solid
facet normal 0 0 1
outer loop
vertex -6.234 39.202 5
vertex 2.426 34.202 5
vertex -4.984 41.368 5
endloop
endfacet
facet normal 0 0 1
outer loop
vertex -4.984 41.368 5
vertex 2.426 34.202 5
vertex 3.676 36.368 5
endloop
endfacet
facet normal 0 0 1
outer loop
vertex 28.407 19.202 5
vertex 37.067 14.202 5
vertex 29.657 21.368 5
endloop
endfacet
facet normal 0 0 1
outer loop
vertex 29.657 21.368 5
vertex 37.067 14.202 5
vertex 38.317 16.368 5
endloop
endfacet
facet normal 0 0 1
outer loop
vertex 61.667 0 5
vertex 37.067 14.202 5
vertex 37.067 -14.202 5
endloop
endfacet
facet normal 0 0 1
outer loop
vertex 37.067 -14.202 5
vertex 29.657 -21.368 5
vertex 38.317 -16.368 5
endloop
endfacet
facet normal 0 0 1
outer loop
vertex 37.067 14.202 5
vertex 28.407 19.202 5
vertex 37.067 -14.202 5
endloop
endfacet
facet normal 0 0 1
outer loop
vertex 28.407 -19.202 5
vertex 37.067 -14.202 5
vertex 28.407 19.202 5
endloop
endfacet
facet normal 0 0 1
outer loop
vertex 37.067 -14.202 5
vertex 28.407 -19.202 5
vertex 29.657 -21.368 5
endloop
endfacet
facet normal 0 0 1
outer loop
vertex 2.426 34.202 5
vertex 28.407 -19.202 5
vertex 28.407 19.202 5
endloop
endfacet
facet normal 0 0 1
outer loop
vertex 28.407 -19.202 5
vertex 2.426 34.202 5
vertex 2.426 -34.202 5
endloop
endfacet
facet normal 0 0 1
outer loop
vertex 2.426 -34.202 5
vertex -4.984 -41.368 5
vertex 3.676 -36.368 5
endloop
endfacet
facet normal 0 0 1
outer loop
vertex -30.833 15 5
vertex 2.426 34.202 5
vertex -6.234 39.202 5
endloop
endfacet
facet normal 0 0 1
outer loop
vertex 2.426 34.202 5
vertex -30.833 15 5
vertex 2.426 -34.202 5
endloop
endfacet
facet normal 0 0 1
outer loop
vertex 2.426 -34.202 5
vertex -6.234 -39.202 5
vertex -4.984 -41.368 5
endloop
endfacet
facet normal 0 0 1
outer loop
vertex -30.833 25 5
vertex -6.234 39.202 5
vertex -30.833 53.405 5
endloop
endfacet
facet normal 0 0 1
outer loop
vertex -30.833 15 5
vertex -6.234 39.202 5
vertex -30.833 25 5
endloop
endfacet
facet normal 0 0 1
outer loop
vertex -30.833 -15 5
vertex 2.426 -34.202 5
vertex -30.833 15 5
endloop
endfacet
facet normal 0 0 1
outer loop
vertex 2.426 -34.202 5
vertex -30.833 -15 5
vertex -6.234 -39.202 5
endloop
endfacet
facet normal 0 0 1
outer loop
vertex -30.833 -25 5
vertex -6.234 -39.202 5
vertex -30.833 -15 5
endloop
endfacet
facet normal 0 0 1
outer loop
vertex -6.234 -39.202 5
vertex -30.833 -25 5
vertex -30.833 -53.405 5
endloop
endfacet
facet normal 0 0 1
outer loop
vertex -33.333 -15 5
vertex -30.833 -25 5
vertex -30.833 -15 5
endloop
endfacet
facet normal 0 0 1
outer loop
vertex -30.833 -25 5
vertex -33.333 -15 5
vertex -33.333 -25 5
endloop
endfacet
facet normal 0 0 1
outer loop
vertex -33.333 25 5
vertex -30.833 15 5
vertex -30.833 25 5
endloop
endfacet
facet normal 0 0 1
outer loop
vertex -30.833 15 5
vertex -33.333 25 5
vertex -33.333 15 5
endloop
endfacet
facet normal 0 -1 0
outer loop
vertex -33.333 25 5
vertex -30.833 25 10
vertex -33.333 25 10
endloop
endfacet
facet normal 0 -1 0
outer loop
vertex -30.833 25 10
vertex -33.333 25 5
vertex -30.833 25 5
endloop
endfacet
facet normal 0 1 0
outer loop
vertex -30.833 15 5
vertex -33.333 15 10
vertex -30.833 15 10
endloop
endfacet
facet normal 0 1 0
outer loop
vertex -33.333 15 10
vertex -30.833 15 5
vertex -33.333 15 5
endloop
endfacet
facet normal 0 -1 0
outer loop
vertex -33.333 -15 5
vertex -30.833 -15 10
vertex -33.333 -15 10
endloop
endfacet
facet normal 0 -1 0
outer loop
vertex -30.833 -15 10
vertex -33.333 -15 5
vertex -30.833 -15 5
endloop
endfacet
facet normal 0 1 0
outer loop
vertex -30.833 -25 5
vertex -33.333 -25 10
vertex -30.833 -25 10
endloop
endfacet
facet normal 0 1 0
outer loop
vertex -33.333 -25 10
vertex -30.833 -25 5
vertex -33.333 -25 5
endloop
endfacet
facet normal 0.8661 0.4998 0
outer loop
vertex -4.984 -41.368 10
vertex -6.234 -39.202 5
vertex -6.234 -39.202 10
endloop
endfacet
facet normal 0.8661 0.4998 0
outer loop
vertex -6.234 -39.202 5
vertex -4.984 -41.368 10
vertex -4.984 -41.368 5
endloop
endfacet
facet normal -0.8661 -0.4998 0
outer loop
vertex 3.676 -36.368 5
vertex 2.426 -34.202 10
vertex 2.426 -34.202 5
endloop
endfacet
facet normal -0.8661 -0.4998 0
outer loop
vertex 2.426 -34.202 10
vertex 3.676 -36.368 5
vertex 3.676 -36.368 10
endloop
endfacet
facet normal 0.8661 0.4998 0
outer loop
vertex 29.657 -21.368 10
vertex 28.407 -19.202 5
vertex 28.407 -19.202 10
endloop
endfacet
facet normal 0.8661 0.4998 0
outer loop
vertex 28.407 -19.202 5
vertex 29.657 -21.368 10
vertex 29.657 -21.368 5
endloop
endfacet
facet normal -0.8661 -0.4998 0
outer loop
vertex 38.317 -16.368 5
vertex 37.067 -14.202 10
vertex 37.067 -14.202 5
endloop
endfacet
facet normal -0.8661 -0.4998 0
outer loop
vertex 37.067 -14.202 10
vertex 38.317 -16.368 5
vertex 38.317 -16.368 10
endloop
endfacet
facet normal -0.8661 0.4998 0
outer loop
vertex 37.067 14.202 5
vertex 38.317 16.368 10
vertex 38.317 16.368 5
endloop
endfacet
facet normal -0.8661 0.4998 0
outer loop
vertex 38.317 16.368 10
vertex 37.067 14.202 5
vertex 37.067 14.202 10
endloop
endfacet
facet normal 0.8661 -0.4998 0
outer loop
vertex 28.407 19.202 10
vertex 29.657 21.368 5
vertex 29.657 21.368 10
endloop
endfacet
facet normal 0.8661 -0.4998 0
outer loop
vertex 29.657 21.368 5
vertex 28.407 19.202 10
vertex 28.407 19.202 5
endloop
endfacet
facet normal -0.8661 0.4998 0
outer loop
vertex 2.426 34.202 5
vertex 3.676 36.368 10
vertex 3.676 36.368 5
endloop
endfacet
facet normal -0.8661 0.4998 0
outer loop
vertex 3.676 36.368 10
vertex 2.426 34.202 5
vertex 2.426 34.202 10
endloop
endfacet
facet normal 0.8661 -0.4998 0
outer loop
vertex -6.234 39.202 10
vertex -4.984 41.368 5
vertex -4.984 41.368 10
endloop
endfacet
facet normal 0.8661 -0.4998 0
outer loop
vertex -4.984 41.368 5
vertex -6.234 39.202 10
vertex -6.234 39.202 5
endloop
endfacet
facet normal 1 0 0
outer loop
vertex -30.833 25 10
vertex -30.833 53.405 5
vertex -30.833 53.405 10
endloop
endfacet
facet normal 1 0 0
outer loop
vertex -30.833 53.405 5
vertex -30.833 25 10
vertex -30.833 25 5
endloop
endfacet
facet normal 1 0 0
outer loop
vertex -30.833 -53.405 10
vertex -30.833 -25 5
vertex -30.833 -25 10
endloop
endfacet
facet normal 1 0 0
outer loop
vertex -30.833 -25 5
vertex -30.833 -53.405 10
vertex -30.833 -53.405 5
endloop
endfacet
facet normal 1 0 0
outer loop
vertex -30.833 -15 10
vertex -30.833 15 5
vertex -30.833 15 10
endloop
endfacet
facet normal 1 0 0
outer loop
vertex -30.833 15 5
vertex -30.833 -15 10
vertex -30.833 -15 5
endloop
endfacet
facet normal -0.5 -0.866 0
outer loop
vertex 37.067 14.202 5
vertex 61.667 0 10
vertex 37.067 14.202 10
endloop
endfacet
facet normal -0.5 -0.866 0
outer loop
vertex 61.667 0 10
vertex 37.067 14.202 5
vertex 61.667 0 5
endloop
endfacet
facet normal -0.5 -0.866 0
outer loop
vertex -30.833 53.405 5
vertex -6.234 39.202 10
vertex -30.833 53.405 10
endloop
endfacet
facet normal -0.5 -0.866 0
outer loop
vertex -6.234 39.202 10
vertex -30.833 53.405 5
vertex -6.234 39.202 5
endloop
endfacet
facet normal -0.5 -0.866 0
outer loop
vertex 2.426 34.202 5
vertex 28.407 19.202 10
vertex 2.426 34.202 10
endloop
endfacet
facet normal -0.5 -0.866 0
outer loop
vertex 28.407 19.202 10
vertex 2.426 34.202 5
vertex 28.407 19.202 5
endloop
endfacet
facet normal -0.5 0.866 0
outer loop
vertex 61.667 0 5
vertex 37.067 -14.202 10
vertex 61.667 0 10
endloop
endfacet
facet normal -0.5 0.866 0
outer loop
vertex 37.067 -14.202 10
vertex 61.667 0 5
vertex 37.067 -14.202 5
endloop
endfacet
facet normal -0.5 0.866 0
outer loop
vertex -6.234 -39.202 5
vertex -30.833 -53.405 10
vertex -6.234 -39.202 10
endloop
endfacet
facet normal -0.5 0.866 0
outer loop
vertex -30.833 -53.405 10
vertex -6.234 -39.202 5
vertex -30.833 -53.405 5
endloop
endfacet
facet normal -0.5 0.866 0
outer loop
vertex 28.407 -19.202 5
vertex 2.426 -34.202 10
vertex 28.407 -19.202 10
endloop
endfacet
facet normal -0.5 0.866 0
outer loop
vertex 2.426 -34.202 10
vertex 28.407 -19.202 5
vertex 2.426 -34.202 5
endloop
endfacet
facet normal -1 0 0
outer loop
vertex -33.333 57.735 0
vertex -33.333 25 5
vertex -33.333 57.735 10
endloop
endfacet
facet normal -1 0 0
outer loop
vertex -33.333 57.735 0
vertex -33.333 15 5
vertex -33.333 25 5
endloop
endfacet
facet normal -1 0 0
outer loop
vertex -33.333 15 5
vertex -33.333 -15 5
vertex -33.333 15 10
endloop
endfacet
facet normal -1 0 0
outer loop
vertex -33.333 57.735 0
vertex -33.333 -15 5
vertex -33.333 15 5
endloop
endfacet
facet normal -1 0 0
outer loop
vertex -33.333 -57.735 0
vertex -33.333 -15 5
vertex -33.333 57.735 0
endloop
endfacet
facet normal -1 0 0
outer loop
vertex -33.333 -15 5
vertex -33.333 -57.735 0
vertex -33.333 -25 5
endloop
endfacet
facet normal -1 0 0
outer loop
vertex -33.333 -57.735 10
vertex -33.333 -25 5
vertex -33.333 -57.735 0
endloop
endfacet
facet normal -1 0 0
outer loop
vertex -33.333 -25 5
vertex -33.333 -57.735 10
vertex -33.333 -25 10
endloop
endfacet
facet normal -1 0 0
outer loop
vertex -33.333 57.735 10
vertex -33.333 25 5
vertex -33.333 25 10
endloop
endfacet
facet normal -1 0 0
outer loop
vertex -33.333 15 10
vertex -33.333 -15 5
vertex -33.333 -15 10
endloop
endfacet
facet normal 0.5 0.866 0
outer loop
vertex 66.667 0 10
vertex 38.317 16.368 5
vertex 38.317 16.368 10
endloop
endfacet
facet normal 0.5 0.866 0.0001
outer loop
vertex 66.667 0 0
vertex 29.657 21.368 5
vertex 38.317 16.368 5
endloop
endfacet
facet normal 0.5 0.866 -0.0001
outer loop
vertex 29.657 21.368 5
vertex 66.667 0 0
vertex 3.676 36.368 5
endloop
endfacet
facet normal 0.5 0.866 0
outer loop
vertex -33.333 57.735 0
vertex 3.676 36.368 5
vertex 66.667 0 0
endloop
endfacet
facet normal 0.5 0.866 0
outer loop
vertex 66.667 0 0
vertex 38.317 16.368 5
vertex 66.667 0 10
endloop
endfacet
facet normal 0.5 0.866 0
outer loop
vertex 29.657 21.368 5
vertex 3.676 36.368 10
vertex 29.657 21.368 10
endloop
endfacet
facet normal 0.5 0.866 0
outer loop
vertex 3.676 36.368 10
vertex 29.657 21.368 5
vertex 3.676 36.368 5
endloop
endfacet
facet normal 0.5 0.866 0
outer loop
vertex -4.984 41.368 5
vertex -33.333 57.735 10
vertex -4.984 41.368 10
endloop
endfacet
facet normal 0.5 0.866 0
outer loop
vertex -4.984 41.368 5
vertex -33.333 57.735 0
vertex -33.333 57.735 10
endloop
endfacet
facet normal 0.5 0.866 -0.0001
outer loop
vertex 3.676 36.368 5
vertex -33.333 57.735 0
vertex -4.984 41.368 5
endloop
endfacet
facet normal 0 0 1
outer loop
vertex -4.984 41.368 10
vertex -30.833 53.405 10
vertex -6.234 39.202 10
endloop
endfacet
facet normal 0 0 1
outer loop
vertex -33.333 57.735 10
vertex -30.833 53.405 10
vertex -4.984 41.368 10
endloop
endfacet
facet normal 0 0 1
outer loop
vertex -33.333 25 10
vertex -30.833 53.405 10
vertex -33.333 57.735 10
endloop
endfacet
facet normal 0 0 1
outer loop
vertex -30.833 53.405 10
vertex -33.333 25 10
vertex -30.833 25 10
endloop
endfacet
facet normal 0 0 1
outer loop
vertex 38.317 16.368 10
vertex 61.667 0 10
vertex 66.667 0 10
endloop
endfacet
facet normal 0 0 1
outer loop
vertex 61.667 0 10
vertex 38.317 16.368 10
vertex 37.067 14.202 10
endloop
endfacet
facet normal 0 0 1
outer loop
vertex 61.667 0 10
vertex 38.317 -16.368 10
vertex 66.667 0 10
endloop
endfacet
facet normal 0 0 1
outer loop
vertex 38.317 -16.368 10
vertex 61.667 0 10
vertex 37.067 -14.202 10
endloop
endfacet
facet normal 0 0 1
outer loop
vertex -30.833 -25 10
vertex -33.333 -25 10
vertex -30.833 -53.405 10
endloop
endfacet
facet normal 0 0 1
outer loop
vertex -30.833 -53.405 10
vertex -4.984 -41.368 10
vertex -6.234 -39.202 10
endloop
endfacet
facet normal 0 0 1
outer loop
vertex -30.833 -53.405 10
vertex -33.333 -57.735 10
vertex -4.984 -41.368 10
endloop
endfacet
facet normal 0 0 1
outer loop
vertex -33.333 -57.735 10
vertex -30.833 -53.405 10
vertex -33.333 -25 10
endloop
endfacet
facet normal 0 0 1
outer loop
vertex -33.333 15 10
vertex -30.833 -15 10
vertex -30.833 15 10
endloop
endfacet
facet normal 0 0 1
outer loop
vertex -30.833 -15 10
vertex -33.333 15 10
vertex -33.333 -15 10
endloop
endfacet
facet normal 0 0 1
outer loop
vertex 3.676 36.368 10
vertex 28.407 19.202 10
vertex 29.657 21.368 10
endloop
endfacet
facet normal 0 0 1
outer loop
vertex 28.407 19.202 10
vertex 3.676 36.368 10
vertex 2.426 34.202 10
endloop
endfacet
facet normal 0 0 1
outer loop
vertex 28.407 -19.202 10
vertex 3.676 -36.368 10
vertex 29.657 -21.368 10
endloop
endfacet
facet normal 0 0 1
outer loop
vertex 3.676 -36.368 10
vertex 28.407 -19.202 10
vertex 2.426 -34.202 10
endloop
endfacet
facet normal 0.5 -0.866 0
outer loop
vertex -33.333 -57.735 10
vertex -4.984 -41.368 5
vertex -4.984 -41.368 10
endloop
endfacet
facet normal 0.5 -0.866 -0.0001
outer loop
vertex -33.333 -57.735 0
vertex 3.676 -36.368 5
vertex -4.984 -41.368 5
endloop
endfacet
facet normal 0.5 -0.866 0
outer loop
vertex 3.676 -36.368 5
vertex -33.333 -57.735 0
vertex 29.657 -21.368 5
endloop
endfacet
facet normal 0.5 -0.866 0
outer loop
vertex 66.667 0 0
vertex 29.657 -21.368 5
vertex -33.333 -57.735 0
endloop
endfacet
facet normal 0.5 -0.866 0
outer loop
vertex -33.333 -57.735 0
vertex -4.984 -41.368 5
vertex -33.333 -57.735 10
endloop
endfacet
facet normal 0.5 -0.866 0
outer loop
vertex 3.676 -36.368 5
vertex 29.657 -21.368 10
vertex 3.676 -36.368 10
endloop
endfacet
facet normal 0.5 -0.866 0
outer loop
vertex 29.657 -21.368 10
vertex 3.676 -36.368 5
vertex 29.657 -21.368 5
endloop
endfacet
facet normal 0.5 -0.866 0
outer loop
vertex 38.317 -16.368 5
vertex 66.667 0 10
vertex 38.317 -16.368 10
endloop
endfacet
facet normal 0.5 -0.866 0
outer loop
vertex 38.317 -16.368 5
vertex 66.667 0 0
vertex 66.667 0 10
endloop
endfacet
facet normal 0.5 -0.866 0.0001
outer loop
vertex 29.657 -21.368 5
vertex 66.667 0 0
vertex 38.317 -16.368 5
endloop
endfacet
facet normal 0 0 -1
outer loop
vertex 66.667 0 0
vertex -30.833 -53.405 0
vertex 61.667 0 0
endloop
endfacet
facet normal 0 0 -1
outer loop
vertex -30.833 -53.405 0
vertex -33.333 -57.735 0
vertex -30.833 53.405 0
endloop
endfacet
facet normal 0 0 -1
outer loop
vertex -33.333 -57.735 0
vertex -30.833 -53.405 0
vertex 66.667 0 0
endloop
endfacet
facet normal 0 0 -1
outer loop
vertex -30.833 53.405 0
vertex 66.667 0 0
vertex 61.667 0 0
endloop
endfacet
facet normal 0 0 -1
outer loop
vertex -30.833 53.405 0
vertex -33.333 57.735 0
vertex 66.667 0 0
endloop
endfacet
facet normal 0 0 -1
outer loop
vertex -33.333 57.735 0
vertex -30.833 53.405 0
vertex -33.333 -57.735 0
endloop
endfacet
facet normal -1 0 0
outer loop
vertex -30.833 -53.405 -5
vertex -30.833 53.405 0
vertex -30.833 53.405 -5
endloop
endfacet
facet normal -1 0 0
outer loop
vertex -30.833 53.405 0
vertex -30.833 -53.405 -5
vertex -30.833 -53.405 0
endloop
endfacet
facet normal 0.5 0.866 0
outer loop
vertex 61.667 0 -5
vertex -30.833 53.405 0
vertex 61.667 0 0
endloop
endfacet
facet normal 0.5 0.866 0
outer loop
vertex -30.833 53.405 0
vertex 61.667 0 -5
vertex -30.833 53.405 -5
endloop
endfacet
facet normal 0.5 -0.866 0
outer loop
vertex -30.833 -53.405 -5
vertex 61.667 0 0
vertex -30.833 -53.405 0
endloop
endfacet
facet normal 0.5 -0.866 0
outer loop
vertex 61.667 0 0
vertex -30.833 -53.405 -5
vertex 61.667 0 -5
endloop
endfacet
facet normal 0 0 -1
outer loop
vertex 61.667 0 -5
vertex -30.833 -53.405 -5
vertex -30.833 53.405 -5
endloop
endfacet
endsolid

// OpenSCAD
// bottom is increased by bevel on axis from centre to point
module triangle (h, r, b=0) {
    cylinder(h=h, r1=r+b, r2=r, $fn=3);
}

tri_height = 100;
tri_width  = tri_height * 2 / sqrt(3);
tri_radius = tri_height * 2 / 3;

thickness = 5;
battlement = 5;

module crenellation (n, w) {
    translate([-tri_radius/2,20,5])
    cube([30,10,10], center=true);        
    translate([-tri_radius/2,-20,5])
    cube([30,10,10], center=true);
} 

module piece () {
    difference() {
        triangle(10, tri_radius, 0);
        translate([0,0,battlement]) {
            triangle(battlement+1, tri_radius-5, 0);
            for (i = [0:2]) rotate([0,0,i*120]) crenellation(2, tri_width);
        }
    }
    translate([0,0,-battlement]) triangle(battlement, tri_radius-5, 0);
}

piece();
